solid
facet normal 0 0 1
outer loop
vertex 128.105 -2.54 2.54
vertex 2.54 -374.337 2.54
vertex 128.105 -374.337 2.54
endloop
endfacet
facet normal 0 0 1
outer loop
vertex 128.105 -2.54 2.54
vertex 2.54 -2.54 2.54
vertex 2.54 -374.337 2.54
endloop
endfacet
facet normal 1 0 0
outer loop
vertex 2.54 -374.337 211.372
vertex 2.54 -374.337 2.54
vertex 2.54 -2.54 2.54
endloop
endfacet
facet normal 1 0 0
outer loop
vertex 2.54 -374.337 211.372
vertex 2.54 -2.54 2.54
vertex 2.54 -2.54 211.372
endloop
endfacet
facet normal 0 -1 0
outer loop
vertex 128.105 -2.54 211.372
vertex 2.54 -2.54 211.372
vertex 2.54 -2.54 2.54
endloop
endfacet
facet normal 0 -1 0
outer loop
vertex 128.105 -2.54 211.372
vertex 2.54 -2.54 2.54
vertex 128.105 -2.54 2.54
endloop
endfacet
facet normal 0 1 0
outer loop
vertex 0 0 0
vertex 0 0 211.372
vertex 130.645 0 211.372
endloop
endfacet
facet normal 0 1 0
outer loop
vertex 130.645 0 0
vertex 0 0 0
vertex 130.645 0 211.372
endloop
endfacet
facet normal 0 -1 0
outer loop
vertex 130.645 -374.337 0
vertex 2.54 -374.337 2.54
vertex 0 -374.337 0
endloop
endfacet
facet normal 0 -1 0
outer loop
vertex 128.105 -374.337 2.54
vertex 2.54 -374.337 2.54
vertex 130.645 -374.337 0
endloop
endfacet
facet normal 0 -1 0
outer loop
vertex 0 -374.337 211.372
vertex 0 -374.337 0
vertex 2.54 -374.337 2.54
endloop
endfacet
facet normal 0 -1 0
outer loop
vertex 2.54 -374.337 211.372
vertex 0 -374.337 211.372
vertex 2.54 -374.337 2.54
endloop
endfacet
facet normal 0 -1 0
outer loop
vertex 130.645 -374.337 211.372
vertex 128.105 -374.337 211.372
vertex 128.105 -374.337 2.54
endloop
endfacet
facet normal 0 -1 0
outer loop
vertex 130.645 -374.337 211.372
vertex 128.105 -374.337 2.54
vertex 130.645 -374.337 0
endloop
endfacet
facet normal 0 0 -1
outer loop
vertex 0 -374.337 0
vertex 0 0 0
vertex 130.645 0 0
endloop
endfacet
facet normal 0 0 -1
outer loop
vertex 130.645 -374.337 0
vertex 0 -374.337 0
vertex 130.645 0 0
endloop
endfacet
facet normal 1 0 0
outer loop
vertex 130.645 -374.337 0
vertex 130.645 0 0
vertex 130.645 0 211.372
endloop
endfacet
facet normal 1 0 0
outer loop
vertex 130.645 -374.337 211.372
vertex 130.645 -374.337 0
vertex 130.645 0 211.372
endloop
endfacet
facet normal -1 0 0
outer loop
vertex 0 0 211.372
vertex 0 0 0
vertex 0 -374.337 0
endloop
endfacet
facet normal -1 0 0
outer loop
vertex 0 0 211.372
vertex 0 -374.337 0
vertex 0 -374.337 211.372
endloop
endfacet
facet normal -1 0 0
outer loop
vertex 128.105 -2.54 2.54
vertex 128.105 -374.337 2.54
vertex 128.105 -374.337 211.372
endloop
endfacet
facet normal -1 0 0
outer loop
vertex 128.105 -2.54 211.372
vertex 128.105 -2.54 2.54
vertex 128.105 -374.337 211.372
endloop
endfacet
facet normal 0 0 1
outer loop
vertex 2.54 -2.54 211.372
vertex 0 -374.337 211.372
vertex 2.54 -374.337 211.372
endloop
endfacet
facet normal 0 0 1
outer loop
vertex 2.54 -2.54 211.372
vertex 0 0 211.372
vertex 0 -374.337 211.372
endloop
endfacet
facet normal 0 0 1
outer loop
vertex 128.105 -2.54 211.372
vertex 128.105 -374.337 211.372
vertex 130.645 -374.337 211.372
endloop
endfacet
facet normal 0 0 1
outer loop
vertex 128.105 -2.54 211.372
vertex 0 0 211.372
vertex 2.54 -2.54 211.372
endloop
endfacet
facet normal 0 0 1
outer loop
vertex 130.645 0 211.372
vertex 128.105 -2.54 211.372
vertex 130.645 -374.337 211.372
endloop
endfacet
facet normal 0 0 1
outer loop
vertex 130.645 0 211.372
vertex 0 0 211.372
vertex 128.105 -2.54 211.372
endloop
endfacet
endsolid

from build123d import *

# Parameters (mm, degrees)
F0_W     = 130.64453
F0_H     = 211.371556
F1_DEPTH = 374.337018
F2_T     = -2.54


with BuildPart() as f1:
    # F0 (on Front) → F1 (new body)
    with BuildSketch(Plane.XZ):
        with Locations((65.322265, 105.685778)):
            Rectangle(F0_W, F0_H)
    extrude(amount=F1_DEPTH)

    # F2
    f2_openings = [f1.faces().sort_by_distance(p)[0] for p in [
        (65.322265, -374.337018, 105.685778),
        (65.322265, -187.168509, 211.371556),
    ]]
    offset(amount=F2_T, openings=f2_openings)


solid = f1.part
